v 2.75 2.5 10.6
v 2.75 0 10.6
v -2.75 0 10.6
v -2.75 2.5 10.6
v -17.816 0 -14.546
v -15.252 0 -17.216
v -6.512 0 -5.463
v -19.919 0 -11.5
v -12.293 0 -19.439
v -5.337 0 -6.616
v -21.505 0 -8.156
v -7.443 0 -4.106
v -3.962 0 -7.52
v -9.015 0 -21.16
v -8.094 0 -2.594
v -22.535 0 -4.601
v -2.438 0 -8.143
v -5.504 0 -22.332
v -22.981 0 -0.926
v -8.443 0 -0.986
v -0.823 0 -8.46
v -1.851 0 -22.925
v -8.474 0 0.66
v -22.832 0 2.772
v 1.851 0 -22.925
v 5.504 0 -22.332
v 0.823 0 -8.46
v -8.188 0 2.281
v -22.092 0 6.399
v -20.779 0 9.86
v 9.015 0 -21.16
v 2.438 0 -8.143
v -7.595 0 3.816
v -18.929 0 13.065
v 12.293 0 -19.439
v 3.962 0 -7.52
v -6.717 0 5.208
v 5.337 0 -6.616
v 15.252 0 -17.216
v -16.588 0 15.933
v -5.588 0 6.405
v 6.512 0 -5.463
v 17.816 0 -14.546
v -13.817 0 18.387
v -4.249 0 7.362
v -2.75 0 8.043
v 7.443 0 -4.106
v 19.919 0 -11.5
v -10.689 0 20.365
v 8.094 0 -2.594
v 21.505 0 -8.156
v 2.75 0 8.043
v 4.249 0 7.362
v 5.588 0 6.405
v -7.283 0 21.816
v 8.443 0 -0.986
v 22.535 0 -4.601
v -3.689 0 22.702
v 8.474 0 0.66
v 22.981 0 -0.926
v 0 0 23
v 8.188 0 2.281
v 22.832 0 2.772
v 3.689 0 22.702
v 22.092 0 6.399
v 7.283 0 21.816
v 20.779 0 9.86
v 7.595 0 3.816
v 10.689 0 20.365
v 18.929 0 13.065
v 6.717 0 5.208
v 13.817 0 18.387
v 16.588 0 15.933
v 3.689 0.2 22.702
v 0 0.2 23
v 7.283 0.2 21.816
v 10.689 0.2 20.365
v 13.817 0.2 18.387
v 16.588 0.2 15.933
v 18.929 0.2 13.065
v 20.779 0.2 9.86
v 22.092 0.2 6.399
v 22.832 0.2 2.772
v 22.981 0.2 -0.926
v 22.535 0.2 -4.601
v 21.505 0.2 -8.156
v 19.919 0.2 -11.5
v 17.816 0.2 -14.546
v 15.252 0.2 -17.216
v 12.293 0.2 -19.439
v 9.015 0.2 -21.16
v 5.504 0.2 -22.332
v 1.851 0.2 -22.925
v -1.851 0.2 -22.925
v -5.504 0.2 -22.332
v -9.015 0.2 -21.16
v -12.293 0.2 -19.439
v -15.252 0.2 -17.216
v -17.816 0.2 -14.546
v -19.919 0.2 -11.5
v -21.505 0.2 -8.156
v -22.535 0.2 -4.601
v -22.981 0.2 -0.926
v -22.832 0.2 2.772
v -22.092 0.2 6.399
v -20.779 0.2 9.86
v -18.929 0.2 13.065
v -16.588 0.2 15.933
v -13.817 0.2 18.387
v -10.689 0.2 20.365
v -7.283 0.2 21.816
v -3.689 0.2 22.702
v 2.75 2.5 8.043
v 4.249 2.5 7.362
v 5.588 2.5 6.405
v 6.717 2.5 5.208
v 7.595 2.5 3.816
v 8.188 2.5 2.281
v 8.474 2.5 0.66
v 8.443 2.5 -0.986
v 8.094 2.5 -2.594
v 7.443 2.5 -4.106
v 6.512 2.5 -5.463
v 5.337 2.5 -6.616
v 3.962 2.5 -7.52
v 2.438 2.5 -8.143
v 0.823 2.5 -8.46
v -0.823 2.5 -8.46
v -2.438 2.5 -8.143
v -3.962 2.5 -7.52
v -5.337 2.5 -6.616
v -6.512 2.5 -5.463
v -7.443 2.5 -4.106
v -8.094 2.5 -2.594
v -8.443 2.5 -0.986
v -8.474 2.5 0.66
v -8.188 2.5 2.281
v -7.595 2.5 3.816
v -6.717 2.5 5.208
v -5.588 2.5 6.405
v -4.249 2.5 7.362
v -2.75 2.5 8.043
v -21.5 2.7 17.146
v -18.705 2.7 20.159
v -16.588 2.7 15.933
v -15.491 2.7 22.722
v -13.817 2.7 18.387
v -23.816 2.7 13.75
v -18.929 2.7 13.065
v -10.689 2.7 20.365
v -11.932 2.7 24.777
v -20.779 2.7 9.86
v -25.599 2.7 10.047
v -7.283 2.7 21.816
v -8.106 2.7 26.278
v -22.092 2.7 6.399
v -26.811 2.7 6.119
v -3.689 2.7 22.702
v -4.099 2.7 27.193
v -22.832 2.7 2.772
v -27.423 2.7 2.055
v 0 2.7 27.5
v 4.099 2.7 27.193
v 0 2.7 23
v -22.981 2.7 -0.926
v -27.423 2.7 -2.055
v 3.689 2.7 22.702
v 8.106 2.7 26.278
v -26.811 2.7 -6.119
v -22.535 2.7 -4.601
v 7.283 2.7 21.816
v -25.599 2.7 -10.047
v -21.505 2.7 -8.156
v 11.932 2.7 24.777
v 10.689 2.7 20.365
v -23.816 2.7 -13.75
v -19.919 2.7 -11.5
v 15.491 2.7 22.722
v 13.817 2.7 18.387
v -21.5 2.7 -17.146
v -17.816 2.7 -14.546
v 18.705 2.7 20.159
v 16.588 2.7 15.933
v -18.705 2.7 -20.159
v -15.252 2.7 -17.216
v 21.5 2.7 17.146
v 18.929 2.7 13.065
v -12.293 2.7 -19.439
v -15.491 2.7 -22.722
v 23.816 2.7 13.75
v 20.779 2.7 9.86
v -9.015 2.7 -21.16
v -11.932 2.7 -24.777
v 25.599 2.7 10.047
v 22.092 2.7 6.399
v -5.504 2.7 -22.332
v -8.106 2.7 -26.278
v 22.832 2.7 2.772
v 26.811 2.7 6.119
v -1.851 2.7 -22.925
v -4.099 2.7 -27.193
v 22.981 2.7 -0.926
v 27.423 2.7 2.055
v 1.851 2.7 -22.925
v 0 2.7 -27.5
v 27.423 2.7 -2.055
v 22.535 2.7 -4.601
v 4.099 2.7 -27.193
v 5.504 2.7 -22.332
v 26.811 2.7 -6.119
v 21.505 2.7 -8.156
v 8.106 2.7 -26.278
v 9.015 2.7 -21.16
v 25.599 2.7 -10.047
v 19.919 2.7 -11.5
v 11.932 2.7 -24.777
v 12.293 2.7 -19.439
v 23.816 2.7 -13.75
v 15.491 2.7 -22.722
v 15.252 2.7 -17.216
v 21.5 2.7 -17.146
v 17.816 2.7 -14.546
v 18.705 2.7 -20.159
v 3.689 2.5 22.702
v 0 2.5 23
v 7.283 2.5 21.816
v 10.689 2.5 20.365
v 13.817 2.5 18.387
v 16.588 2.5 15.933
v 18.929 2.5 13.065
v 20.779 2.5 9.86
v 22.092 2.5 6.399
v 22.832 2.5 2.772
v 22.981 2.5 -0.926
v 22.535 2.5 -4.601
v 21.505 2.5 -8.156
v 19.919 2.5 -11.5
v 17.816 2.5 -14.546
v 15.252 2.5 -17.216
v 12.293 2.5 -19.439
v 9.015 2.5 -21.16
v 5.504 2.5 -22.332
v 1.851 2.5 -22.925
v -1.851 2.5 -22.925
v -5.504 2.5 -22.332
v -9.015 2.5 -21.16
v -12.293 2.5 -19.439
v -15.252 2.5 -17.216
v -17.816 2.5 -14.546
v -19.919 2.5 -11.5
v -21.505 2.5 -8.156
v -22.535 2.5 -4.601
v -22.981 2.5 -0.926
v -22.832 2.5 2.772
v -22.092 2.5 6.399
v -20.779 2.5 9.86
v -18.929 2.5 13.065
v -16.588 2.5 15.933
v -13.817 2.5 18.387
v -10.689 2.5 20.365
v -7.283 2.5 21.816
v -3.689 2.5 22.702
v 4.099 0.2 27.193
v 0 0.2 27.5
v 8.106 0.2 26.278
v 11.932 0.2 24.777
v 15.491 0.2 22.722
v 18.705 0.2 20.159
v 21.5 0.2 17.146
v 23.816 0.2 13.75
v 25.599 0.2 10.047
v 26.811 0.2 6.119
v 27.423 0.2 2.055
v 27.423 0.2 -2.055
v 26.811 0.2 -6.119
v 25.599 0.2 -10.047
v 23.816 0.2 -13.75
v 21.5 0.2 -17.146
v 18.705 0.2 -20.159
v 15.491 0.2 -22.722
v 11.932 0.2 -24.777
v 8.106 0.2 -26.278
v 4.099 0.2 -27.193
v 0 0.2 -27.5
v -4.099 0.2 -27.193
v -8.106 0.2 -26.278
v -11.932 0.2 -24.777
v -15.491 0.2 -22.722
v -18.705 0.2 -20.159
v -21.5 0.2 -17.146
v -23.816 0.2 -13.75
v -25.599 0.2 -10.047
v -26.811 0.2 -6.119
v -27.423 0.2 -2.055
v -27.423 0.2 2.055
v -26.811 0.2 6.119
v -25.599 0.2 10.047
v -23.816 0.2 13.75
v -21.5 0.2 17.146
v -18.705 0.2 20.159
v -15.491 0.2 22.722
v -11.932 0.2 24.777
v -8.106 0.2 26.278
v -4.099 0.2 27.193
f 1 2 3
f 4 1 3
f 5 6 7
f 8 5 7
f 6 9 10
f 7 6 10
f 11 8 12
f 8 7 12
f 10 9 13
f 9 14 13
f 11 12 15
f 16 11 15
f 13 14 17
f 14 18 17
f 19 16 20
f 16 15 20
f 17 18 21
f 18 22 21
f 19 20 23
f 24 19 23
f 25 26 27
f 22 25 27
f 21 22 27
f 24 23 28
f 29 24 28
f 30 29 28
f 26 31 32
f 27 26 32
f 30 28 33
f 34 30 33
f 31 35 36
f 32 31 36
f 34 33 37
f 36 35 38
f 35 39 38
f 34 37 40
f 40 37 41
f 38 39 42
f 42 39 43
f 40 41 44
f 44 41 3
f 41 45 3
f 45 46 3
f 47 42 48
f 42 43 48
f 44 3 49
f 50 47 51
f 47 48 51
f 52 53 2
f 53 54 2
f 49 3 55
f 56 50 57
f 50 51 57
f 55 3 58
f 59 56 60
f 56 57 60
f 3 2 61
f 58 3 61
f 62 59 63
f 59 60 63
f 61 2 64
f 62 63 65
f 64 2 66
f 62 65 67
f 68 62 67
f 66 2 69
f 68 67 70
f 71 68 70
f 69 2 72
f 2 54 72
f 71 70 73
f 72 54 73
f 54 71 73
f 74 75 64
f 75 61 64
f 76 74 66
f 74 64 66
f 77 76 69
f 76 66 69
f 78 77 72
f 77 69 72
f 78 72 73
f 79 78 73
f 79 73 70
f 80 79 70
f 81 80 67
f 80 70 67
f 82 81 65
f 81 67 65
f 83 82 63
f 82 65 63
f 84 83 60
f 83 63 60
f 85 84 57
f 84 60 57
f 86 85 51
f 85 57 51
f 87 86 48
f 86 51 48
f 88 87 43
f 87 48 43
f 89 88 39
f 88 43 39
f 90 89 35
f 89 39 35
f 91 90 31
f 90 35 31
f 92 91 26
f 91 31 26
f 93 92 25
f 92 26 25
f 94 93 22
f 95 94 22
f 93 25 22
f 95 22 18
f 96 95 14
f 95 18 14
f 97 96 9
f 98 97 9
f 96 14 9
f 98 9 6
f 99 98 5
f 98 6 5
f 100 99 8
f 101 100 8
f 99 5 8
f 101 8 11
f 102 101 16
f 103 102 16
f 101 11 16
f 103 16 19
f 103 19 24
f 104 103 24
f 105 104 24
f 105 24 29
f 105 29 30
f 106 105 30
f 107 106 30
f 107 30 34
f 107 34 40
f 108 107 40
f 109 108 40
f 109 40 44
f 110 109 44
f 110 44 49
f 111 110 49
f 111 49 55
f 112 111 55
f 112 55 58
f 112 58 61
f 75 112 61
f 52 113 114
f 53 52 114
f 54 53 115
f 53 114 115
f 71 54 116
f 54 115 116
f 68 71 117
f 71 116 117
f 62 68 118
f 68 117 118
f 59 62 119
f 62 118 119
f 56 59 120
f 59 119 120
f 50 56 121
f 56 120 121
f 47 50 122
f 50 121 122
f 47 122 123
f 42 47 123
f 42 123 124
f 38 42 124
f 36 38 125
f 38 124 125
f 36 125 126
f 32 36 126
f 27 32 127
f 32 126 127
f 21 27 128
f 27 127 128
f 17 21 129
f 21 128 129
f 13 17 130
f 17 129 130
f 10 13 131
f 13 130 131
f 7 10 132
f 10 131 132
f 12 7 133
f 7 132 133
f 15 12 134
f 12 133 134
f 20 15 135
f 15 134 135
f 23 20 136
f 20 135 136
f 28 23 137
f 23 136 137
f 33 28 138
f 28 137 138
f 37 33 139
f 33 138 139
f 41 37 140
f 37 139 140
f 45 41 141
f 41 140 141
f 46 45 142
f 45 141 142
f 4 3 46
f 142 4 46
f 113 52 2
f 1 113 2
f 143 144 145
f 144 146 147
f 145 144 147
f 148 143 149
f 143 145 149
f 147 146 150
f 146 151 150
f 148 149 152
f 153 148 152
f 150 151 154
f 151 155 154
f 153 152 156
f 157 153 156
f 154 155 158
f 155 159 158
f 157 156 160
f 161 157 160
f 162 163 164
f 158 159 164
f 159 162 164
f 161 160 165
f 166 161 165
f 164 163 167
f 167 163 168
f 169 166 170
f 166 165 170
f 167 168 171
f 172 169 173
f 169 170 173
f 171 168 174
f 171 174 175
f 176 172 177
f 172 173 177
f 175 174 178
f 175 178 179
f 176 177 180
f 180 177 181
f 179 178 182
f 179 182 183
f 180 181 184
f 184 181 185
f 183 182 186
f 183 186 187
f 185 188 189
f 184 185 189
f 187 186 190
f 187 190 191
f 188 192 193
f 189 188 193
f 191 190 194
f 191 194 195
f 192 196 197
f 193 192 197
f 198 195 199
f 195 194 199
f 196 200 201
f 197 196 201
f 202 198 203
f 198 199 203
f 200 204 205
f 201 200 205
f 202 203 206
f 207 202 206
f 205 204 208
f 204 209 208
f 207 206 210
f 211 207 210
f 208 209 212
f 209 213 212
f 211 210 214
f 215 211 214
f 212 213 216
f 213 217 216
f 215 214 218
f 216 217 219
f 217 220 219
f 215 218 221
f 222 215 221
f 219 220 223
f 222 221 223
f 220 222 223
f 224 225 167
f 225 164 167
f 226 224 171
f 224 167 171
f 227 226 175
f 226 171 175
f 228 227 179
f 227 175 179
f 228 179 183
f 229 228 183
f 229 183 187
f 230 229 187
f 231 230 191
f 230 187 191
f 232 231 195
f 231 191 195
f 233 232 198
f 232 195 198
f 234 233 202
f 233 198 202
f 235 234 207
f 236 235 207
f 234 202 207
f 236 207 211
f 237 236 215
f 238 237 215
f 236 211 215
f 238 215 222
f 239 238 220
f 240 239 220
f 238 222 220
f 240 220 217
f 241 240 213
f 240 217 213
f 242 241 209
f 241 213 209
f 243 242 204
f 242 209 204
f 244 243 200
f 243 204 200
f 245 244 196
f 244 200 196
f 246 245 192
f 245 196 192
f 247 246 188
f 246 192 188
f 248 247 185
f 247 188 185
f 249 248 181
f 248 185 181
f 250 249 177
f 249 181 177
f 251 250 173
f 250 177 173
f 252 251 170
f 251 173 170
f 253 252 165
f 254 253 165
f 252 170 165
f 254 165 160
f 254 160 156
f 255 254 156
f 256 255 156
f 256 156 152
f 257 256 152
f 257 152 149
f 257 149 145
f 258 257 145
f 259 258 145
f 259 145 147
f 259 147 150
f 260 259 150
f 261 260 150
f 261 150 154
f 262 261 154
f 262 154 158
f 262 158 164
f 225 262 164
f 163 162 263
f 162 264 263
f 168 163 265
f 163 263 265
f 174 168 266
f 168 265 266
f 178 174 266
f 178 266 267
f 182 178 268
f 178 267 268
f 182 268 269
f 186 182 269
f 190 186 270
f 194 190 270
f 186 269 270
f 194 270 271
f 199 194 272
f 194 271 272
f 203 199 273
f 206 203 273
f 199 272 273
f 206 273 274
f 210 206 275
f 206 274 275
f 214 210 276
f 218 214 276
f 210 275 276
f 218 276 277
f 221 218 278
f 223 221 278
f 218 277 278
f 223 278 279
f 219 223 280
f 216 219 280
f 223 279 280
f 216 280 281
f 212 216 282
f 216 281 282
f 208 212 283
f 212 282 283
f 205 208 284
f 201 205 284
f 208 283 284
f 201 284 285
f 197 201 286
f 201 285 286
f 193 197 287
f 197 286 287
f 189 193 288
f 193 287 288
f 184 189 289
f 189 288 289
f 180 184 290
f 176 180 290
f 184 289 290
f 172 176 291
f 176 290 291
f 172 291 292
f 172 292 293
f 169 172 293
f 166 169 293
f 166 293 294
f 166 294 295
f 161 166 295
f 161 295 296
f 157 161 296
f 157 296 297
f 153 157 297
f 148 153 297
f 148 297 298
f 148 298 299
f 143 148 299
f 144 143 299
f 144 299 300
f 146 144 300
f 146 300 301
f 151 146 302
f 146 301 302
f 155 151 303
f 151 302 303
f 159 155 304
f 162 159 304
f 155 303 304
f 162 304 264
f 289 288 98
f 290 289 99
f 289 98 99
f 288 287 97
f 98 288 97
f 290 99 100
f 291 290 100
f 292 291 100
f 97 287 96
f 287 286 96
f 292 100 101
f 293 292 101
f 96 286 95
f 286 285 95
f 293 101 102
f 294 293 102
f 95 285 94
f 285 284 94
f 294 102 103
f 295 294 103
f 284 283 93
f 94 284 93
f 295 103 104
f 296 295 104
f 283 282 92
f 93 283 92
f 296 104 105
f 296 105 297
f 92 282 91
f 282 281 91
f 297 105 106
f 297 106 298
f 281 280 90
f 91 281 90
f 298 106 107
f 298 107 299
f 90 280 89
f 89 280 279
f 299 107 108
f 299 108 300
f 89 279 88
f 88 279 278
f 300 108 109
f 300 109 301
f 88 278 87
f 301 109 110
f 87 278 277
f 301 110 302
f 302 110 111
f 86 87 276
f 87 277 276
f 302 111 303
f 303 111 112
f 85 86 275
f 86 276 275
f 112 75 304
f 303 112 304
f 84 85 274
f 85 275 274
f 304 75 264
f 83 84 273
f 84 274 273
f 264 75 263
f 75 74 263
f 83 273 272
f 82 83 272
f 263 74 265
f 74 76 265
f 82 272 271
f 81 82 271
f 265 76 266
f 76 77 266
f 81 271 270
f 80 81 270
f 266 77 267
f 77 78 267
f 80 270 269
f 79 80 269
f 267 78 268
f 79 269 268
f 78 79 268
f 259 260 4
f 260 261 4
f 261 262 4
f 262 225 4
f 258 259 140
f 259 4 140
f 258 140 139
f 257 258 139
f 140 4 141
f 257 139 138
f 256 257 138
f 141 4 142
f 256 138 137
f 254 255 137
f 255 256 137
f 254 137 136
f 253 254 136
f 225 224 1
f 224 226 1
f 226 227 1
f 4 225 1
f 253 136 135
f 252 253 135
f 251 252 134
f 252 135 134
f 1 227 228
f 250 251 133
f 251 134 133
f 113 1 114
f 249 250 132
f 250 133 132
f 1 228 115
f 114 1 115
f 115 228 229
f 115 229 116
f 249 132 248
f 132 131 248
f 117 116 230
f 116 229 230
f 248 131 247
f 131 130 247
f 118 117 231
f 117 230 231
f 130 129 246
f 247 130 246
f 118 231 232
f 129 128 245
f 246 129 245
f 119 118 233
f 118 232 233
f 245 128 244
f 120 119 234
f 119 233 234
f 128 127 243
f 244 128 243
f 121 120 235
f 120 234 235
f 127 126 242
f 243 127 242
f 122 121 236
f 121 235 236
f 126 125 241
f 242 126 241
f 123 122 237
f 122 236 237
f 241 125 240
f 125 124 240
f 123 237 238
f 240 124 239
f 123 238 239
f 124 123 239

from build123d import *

# Parameters (mm, degrees)
F3_DEPTH = 2.701


with BuildPart() as f1:
    # F0 (on Right) → F1 (revolve)
    with BuildSketch(Plane.YZ):
        Polygon((0, 23), (0, 8.5), (2.5, 8.5), (2.5, 23), (2.7, 23), (2.7, 27.5), (0.2, 27.5), (0.2, 23), align=None)
    revolve(axis=Axis((0, 1.25, 0), (0, 1, 0)))

    # F2 (on Front) → F3 (cut, through all)
    with BuildSketch(Plane.XZ):
        with BuildLine():
            Line((2.75, 10.6), (-2.75, 10.6))
            Line((-2.75, 10.6), (-2.75, 8.042854))
            ThreePointArc((-2.75, 8.042854), (0, 8.5), (2.75, 8.042854))
            Line((2.75, 8.042854), (2.75, 10.6))
        make_face()
    extrude(amount=-F3_DEPTH, mode=Mode.SUBTRACT)


solid = f1.part
